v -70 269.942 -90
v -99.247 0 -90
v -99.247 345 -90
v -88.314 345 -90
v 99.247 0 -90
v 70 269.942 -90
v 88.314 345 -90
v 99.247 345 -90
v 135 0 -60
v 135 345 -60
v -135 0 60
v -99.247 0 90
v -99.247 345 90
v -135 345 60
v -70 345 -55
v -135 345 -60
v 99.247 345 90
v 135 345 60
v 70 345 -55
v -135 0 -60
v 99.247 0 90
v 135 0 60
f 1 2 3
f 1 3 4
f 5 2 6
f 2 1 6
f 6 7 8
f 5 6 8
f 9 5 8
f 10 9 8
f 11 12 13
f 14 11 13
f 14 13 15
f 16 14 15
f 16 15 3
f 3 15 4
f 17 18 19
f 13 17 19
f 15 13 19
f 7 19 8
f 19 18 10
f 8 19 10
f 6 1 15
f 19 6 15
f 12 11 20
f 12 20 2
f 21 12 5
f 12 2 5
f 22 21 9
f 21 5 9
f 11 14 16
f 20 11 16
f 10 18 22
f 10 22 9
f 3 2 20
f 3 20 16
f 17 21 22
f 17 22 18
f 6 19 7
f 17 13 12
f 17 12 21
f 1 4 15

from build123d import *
from OCP.BRepFilletAPI import BRepFilletAPI_MakeChamfer

# Parameters (mm, degrees)
ESQUISSE1_W             = 270
ESQUISSE1_H             = 180
BOSS_EXTRU_1_DEPTH      = 345
CHANFREIN1_SIZE         = 30
CHANFREIN1_SIZE2        = 35.752607778
ENL_V_MAT_EXTRU_1_DEPTH = 90
CHANFREIN2_SIZE         = 20
CHANFREIN2_SIZE_2       = 34.641016151


with BuildPart() as part:
    # Esquisse1 → Boss.-Extru.1 (new body)
    with BuildSketch(Plane(origin=(0, 0, 0), x_dir=(1, 0, 0), z_dir=(0, 1, 0))):
        Rectangle(ESQUISSE1_W, ESQUISSE1_H)
    extrude(amount=BOSS_EXTRU_1_DEPTH)

    # Chanfrein1: one chamfer whose edges measure the first distance from different faces: ONE call of the kernel's chamfer builder (chamfer() names one face for all edges)
    chanfrein1_edges_1 = [part.edges().sort_by_distance(p)[0] for p in [
        (135, 172.5, 90),
        (135, 172.5, -90),
    ]]
    chanfrein1_side_1 = [part.faces().sort_by_distance(p)[0] for p in [
        (135, 172.5, 0),
    ]]
    chanfrein1_edges_2 = [part.edges().sort_by_distance(p)[0] for p in [
        (-135, 172.5, 90),
        (-135, 172.5, -90),
    ]]
    chanfrein1_side_2 = [part.faces().sort_by_distance(p)[0] for p in [
        (-135, 172.5, 0),
    ]]
    chanfrein1 = BRepFilletAPI_MakeChamfer(part.part.solid().wrapped)
    for e in chanfrein1_edges_1:
        chanfrein1.Add(CHANFREIN1_SIZE, CHANFREIN1_SIZE2, e.wrapped, chanfrein1_side_1[0].wrapped)  # the first distance lies on this face
    for e in chanfrein1_edges_2:
        chanfrein1.Add(CHANFREIN1_SIZE, CHANFREIN1_SIZE2, e.wrapped, chanfrein1_side_2[0].wrapped)  # the first distance lies on this face
    add(Compound.cast(chanfrein1.Shape()), mode=Mode.REPLACE)

    # Esquisse2 → Enlèv. mat.-Extru.1 (cut, symmetric)
    with BuildSketch(Plane(origin=(0, 0, 0), x_dir=(0, 0, -1), z_dir=(1, 0, 0))):
        Polygon((55, 345), (255, 345), (255, -83.901384102), align=None)
    extrude(amount=ENL_V_MAT_EXTRU_1_DEPTH, both=True, mode=Mode.SUBTRACT)

    # Chanfrein2
    # the kernel refuses this chamfer: 34.641016151, 20 mm, written as the material it adds along each edge
    with BuildSketch(Plane(origin=(90, 188.719606983, -127.874744083), x_dir=(-0.9983227437537926, -0.02446700349407226, 0.05246965831716883), z_dir=(0, 0.9063077870366479, 0.422618261740704))) as chanfrein2_piece_1_section:
        Polygon((CHANFREIN2_SIZE * 0.998322743754, -CHANFREIN2_SIZE * 0.0578938624027), (-CHANFREIN2_SIZE_2 * 0.0578938624033, -CHANFREIN2_SIZE_2 * 0.998322743765), (0, 0), align=None)
    chanfrein2_piece_1 = extrude(amount=262.055614234, mode=Mode.PRIVATE)
    chanfrein2_piece_1 = split(chanfrein2_piece_1, bisect_by=Plane(origin=(82.381838985, 345, -77.051948242), z_dir=(0, -1, 0)), keep=Keep.TOP, mode=Mode.PRIVATE)
    chanfrein2_piece_1 = split(chanfrein2_piece_1, bisect_by=Plane(origin=(82.381838985, 317.232813397, -90), z_dir=(0, 0, 1)), keep=Keep.TOP, mode=Mode.PRIVATE)
    add(chanfrein2_piece_1)
    with BuildSketch(Plane(origin=(-90, 188.719606983, -127.874744083), x_dir=(-0.0193267656127005, 0.42253932536473243, -0.906138507432097), z_dir=(0, 0.9063077870366479, 0.422618261740704))) as chanfrein2_piece_2_section:
        Polygon((CHANFREIN2_SIZE_2 * 0.999813220633, -CHANFREIN2_SIZE_2 * 0.0193267656129), (-CHANFREIN2_SIZE * 0.0193267656127, -CHANFREIN2_SIZE * 0.999813220622), (0, 0), align=None)
    chanfrein2_piece_2 = extrude(amount=262.055614234, mode=Mode.PRIVATE)
    chanfrein2_piece_2 = split(chanfrein2_piece_2, bisect_by=Plane(origin=(-82.381838985, 345, -77.051948242), z_dir=(0, -1, 0)), keep=Keep.TOP, mode=Mode.PRIVATE)
    chanfrein2_piece_2 = split(chanfrein2_piece_2, bisect_by=Plane(origin=(-82.381838985, 317.232813397, -90), z_dir=(0, 0, 1)), keep=Keep.TOP, mode=Mode.PRIVATE)
    add(chanfrein2_piece_2)


solid = part.part
